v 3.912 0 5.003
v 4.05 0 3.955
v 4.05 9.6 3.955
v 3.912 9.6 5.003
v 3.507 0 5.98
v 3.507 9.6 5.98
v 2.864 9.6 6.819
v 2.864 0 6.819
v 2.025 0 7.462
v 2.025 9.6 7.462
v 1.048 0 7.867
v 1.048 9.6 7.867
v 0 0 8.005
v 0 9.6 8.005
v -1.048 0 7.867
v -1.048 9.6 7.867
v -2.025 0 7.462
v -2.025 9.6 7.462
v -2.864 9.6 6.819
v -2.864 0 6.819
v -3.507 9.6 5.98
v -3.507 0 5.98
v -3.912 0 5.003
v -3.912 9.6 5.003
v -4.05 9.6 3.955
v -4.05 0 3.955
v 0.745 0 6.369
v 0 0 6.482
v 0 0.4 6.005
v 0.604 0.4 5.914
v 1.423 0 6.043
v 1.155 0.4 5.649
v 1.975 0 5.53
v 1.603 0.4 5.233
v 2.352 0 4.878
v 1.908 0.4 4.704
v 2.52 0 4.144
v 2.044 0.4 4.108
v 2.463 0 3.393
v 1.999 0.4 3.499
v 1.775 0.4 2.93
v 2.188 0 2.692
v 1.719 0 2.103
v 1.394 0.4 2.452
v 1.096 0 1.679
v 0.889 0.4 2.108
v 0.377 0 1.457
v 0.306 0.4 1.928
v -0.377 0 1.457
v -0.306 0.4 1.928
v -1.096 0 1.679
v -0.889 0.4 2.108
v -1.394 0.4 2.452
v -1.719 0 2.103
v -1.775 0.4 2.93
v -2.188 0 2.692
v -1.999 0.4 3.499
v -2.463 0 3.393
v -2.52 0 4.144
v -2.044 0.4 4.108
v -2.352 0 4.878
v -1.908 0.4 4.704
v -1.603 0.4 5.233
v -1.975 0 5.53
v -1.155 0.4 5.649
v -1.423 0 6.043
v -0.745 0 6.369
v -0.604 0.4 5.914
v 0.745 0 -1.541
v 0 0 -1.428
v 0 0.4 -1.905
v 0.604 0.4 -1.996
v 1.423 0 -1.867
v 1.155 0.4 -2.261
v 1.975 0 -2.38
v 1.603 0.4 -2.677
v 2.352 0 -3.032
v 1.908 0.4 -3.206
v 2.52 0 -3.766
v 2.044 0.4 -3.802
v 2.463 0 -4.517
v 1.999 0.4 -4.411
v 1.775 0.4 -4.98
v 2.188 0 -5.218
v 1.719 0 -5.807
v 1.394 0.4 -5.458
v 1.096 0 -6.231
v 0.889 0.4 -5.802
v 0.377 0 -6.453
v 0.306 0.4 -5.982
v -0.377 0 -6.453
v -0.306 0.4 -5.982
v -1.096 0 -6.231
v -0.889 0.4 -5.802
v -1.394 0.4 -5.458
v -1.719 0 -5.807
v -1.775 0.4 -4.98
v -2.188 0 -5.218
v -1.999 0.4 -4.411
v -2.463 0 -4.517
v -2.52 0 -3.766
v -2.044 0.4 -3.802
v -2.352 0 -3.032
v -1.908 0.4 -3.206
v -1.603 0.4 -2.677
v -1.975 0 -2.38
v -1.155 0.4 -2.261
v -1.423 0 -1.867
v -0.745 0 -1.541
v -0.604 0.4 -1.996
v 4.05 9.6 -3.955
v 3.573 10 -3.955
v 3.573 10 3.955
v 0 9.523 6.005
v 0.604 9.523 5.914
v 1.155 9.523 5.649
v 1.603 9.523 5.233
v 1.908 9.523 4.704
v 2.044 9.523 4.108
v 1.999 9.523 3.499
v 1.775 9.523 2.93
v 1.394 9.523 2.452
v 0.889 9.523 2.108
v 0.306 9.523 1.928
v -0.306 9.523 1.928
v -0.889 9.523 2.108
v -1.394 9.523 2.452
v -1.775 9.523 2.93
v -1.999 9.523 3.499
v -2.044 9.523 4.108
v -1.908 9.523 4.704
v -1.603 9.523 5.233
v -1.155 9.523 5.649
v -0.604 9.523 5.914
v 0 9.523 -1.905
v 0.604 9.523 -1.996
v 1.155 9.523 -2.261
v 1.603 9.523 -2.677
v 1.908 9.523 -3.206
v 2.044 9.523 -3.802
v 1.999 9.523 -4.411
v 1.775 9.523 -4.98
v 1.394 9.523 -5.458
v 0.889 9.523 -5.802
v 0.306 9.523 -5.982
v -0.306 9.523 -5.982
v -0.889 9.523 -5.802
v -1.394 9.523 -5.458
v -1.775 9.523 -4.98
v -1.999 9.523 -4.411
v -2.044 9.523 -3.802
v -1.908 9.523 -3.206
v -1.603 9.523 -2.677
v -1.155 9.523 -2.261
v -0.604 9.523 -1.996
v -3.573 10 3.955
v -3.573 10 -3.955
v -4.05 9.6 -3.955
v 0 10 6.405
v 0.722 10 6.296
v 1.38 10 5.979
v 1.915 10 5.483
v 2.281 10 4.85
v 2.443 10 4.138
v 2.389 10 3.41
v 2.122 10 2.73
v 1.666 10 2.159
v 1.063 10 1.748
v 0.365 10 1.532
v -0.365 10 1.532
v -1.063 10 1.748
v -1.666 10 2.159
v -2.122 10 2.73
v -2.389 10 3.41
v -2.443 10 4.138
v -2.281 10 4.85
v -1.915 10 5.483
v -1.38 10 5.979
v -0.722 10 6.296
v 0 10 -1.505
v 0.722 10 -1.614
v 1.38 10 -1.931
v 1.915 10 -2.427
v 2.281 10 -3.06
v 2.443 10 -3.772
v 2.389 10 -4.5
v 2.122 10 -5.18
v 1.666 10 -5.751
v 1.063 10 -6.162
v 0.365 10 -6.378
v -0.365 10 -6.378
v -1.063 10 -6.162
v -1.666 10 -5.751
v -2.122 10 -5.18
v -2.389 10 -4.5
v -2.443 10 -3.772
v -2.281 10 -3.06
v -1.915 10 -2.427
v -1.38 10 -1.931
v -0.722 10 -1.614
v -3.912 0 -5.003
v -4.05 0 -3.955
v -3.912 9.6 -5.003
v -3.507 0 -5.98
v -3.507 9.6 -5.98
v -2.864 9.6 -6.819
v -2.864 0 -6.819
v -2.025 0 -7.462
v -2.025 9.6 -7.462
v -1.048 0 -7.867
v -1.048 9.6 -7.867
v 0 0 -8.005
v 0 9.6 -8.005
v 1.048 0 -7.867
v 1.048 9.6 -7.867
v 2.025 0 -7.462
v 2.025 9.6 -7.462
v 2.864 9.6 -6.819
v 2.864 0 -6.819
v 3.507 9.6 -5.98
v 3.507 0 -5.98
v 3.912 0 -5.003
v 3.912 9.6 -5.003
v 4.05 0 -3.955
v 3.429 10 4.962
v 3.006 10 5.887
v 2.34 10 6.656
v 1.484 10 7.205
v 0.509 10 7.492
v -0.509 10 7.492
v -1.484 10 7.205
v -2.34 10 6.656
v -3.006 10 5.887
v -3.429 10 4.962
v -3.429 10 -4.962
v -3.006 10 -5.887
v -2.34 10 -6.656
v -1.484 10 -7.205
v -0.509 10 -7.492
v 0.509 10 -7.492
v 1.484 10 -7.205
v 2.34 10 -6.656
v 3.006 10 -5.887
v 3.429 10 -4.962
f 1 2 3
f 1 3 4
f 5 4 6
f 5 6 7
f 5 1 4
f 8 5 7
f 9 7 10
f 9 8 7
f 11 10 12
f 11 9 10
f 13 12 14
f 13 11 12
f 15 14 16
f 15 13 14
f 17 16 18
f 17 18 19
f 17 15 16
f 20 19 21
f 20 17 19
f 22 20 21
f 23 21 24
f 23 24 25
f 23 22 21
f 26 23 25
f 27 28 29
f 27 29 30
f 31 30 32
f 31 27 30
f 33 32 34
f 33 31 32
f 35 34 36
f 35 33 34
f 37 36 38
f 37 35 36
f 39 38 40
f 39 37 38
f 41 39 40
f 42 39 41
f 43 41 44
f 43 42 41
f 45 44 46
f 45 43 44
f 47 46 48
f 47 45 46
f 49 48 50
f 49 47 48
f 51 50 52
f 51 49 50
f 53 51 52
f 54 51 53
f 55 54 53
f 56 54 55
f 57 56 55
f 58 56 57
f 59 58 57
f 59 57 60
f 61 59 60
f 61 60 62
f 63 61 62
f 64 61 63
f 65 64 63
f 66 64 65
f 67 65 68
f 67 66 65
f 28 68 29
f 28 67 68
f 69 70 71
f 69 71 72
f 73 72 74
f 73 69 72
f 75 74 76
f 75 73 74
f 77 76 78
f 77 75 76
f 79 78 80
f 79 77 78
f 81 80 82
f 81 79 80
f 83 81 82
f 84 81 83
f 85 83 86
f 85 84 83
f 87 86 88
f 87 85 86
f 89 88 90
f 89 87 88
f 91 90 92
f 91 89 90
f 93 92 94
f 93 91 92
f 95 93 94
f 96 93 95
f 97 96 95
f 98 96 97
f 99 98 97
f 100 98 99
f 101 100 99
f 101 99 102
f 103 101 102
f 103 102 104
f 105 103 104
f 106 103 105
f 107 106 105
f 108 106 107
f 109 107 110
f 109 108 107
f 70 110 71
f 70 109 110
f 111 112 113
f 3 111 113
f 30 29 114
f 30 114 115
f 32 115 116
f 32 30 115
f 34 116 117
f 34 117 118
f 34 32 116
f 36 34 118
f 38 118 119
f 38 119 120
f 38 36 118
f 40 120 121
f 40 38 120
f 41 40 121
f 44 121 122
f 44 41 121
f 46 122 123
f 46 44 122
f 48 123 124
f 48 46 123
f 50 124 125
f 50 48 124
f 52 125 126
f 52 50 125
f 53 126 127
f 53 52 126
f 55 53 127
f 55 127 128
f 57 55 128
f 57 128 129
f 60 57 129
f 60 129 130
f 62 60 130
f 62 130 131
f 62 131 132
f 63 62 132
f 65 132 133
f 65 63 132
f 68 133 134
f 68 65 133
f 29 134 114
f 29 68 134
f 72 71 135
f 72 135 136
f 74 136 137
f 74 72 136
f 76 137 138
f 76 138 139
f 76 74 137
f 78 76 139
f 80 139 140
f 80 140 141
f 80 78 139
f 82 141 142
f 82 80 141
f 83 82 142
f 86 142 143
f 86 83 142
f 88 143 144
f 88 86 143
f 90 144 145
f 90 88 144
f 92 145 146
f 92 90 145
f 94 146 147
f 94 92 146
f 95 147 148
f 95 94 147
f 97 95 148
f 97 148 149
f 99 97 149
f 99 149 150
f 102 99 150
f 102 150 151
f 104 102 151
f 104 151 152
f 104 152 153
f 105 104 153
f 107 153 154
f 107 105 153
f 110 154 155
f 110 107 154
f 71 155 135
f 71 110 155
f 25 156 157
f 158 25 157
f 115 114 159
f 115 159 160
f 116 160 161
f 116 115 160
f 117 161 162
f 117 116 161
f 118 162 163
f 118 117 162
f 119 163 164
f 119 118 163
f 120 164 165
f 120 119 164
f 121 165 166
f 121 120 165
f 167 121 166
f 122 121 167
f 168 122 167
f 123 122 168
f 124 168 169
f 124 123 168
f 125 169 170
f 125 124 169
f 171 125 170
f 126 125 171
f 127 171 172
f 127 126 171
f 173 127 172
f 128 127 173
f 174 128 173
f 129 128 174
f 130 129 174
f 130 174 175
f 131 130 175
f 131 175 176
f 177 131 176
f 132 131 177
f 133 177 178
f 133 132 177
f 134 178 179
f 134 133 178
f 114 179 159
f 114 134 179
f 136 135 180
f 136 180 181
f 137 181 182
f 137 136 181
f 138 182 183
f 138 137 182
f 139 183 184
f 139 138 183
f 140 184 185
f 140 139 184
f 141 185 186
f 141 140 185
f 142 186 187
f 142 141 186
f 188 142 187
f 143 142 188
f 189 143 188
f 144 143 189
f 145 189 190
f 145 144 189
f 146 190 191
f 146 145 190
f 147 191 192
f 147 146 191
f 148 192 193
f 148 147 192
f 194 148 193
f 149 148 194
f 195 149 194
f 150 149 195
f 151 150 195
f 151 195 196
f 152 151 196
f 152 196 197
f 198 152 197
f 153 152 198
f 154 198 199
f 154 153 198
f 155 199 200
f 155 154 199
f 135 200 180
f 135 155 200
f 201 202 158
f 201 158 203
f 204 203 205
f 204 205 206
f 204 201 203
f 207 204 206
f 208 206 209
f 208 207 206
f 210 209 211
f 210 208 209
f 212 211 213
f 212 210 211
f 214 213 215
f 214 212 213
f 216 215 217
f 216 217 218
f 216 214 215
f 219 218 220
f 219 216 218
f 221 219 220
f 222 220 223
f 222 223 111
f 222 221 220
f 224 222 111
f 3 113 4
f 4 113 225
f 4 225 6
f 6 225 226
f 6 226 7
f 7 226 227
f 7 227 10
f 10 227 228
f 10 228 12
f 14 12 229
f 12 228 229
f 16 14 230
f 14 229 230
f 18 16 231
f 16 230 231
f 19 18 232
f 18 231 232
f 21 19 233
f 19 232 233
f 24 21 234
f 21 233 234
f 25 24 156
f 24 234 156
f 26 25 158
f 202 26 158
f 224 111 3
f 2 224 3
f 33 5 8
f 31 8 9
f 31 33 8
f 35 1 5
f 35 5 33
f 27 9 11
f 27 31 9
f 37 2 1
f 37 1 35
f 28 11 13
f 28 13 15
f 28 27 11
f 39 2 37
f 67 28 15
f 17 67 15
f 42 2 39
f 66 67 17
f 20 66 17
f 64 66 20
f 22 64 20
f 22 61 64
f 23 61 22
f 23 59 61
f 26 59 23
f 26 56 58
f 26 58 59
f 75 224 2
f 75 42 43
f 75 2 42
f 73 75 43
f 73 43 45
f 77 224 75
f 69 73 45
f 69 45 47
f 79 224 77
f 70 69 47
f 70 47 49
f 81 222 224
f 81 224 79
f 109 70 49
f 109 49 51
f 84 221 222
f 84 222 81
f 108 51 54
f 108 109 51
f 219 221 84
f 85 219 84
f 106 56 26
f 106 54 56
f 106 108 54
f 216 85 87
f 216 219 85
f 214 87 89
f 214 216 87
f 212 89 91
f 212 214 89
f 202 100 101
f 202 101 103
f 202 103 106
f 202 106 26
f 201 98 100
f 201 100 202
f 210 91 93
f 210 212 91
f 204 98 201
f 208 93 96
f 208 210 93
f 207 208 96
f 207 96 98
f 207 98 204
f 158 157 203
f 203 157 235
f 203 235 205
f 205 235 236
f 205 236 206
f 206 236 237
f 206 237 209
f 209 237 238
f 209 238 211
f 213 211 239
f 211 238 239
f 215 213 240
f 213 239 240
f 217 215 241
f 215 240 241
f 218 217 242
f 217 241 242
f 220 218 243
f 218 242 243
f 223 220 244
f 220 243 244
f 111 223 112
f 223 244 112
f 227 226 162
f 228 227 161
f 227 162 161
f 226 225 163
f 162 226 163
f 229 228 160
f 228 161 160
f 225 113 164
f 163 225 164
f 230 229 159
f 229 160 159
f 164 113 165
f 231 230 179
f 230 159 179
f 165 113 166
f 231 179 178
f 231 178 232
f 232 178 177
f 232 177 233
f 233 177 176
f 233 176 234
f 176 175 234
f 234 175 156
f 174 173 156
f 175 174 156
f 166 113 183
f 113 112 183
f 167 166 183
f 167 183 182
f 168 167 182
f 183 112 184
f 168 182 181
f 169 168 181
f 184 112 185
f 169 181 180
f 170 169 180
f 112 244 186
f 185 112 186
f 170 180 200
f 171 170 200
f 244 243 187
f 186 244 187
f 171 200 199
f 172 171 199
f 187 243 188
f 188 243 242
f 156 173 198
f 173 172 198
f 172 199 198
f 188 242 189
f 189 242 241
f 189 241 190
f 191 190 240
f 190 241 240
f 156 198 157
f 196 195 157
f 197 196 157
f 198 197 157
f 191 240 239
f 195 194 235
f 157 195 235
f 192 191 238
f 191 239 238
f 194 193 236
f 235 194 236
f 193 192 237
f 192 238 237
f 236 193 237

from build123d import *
from OCP.BRepFilletAPI import BRepFilletAPI_MakeChamfer

# Parameters (mm, degrees)
SKETCH1_R           = 2.05
BOSS_EXTRUDE1_DEPTH = 10
CHAMFER1_SIZE       = 0.4
CHAMFER1_SIZE2      = 0.476701437


with BuildPart() as part:
    # Sketch1 → Boss-Extrude1 (new body)
    with BuildSketch(Plane(origin=(0, 0, 0), x_dir=(1, 0, 0), z_dir=(0, 1, 0))):
        with BuildLine():
            Line((-4.05, -3.955), (-4.05, 3.955))
            ThreePointArc((-4.05, 3.955), (0, 8.005), (4.05, 3.955))
            Line((4.05, 3.955), (4.05, -3.955))
            ThreePointArc((4.05, -3.955), (0, -8.005), (-4.05, -3.955))
        make_face()
        with Locations(Location((0, 3.955, 0), (0, 0, 270))):
            Circle(SKETCH1_R, mode=Mode.SUBTRACT)
        with Locations(Location((0, -3.955, 0), (0, 0, 270))):
            Circle(SKETCH1_R, mode=Mode.SUBTRACT)
    extrude(amount=BOSS_EXTRUDE1_DEPTH)

    # Chamfer1: one chamfer whose edges measure the first distance from different faces: ONE call of the kernel's chamfer builder (chamfer() names one face for all edges)
    chamfer1_edges_1 = [part.edges().sort_by_distance(p)[0] for p in [
        (0, 0, -6.005),
    ]]
    chamfer1_side_1 = [part.faces().sort_by_distance(p)[0] for p in [
        (0, 5, -6.005),
    ]]
    chamfer1_edges_2 = [part.edges().sort_by_distance(p)[0] for p in [
        (0, 10, -6.005),
        (0, 10, 1.905),
    ]]
    chamfer1_side_2 = [part.faces().sort_by_distance(p)[0] for p in [
        (0, 10, 0),
    ]]
    chamfer1_edges_3 = [part.edges().sort_by_distance(p)[0] for p in [
        (0, 10, -8.005),
    ]]
    chamfer1_side_3 = [part.faces().sort_by_distance(p)[0] for p in [
        (0, 5, -8.005),
    ]]
    chamfer1_edges_4 = [part.edges().sort_by_distance(p)[0] for p in [
        (0, 0, 1.905),
    ]]
    chamfer1_side_4 = [part.faces().sort_by_distance(p)[0] for p in [
        (0, 5, 1.905),
    ]]
    chamfer1_edges_5 = [part.edges().sort_by_distance(p)[0] for p in [
        (-4.05, 10, 0),
    ]]
    chamfer1_side_5 = [part.faces().sort_by_distance(p)[0] for p in [
        (-4.05, 5, 0),
    ]]
    chamfer1_edges_6 = [part.edges().sort_by_distance(p)[0] for p in [
        (0, 10, 8.005),
    ]]
    chamfer1_side_6 = [part.faces().sort_by_distance(p)[0] for p in [
        (0, 5, 8.005),
    ]]
    chamfer1_edges_7 = [part.edges().sort_by_distance(p)[0] for p in [
        (4.05, 10, 0),
    ]]
    chamfer1_side_7 = [part.faces().sort_by_distance(p)[0] for p in [
        (4.05, 5, 0),
    ]]
    chamfer1 = BRepFilletAPI_MakeChamfer(part.part.solid().wrapped)
    for e in chamfer1_edges_1:
        chamfer1.Add(CHAMFER1_SIZE, CHAMFER1_SIZE2, e.wrapped, chamfer1_side_1[0].wrapped)  # the first distance lies on this face
    for e in chamfer1_edges_2:
        chamfer1.Add(CHAMFER1_SIZE, CHAMFER1_SIZE2, e.wrapped, chamfer1_side_2[0].wrapped)  # the first distance lies on this face
    for e in chamfer1_edges_3:
        chamfer1.Add(CHAMFER1_SIZE, CHAMFER1_SIZE2, e.wrapped, chamfer1_side_3[0].wrapped)  # the first distance lies on this face
    for e in chamfer1_edges_4:
        chamfer1.Add(CHAMFER1_SIZE, CHAMFER1_SIZE2, e.wrapped, chamfer1_side_4[0].wrapped)  # the first distance lies on this face
    for e in chamfer1_edges_5:
        chamfer1.Add(CHAMFER1_SIZE, CHAMFER1_SIZE2, e.wrapped, chamfer1_side_5[0].wrapped)  # the first distance lies on this face
    for e in chamfer1_edges_6:
        chamfer1.Add(CHAMFER1_SIZE, CHAMFER1_SIZE2, e.wrapped, chamfer1_side_6[0].wrapped)  # the first distance lies on this face
    for e in chamfer1_edges_7:
        chamfer1.Add(CHAMFER1_SIZE, CHAMFER1_SIZE2, e.wrapped, chamfer1_side_7[0].wrapped)  # the first distance lies on this face
    add(Compound.cast(chamfer1.Shape()), mode=Mode.REPLACE)


solid = part.part
